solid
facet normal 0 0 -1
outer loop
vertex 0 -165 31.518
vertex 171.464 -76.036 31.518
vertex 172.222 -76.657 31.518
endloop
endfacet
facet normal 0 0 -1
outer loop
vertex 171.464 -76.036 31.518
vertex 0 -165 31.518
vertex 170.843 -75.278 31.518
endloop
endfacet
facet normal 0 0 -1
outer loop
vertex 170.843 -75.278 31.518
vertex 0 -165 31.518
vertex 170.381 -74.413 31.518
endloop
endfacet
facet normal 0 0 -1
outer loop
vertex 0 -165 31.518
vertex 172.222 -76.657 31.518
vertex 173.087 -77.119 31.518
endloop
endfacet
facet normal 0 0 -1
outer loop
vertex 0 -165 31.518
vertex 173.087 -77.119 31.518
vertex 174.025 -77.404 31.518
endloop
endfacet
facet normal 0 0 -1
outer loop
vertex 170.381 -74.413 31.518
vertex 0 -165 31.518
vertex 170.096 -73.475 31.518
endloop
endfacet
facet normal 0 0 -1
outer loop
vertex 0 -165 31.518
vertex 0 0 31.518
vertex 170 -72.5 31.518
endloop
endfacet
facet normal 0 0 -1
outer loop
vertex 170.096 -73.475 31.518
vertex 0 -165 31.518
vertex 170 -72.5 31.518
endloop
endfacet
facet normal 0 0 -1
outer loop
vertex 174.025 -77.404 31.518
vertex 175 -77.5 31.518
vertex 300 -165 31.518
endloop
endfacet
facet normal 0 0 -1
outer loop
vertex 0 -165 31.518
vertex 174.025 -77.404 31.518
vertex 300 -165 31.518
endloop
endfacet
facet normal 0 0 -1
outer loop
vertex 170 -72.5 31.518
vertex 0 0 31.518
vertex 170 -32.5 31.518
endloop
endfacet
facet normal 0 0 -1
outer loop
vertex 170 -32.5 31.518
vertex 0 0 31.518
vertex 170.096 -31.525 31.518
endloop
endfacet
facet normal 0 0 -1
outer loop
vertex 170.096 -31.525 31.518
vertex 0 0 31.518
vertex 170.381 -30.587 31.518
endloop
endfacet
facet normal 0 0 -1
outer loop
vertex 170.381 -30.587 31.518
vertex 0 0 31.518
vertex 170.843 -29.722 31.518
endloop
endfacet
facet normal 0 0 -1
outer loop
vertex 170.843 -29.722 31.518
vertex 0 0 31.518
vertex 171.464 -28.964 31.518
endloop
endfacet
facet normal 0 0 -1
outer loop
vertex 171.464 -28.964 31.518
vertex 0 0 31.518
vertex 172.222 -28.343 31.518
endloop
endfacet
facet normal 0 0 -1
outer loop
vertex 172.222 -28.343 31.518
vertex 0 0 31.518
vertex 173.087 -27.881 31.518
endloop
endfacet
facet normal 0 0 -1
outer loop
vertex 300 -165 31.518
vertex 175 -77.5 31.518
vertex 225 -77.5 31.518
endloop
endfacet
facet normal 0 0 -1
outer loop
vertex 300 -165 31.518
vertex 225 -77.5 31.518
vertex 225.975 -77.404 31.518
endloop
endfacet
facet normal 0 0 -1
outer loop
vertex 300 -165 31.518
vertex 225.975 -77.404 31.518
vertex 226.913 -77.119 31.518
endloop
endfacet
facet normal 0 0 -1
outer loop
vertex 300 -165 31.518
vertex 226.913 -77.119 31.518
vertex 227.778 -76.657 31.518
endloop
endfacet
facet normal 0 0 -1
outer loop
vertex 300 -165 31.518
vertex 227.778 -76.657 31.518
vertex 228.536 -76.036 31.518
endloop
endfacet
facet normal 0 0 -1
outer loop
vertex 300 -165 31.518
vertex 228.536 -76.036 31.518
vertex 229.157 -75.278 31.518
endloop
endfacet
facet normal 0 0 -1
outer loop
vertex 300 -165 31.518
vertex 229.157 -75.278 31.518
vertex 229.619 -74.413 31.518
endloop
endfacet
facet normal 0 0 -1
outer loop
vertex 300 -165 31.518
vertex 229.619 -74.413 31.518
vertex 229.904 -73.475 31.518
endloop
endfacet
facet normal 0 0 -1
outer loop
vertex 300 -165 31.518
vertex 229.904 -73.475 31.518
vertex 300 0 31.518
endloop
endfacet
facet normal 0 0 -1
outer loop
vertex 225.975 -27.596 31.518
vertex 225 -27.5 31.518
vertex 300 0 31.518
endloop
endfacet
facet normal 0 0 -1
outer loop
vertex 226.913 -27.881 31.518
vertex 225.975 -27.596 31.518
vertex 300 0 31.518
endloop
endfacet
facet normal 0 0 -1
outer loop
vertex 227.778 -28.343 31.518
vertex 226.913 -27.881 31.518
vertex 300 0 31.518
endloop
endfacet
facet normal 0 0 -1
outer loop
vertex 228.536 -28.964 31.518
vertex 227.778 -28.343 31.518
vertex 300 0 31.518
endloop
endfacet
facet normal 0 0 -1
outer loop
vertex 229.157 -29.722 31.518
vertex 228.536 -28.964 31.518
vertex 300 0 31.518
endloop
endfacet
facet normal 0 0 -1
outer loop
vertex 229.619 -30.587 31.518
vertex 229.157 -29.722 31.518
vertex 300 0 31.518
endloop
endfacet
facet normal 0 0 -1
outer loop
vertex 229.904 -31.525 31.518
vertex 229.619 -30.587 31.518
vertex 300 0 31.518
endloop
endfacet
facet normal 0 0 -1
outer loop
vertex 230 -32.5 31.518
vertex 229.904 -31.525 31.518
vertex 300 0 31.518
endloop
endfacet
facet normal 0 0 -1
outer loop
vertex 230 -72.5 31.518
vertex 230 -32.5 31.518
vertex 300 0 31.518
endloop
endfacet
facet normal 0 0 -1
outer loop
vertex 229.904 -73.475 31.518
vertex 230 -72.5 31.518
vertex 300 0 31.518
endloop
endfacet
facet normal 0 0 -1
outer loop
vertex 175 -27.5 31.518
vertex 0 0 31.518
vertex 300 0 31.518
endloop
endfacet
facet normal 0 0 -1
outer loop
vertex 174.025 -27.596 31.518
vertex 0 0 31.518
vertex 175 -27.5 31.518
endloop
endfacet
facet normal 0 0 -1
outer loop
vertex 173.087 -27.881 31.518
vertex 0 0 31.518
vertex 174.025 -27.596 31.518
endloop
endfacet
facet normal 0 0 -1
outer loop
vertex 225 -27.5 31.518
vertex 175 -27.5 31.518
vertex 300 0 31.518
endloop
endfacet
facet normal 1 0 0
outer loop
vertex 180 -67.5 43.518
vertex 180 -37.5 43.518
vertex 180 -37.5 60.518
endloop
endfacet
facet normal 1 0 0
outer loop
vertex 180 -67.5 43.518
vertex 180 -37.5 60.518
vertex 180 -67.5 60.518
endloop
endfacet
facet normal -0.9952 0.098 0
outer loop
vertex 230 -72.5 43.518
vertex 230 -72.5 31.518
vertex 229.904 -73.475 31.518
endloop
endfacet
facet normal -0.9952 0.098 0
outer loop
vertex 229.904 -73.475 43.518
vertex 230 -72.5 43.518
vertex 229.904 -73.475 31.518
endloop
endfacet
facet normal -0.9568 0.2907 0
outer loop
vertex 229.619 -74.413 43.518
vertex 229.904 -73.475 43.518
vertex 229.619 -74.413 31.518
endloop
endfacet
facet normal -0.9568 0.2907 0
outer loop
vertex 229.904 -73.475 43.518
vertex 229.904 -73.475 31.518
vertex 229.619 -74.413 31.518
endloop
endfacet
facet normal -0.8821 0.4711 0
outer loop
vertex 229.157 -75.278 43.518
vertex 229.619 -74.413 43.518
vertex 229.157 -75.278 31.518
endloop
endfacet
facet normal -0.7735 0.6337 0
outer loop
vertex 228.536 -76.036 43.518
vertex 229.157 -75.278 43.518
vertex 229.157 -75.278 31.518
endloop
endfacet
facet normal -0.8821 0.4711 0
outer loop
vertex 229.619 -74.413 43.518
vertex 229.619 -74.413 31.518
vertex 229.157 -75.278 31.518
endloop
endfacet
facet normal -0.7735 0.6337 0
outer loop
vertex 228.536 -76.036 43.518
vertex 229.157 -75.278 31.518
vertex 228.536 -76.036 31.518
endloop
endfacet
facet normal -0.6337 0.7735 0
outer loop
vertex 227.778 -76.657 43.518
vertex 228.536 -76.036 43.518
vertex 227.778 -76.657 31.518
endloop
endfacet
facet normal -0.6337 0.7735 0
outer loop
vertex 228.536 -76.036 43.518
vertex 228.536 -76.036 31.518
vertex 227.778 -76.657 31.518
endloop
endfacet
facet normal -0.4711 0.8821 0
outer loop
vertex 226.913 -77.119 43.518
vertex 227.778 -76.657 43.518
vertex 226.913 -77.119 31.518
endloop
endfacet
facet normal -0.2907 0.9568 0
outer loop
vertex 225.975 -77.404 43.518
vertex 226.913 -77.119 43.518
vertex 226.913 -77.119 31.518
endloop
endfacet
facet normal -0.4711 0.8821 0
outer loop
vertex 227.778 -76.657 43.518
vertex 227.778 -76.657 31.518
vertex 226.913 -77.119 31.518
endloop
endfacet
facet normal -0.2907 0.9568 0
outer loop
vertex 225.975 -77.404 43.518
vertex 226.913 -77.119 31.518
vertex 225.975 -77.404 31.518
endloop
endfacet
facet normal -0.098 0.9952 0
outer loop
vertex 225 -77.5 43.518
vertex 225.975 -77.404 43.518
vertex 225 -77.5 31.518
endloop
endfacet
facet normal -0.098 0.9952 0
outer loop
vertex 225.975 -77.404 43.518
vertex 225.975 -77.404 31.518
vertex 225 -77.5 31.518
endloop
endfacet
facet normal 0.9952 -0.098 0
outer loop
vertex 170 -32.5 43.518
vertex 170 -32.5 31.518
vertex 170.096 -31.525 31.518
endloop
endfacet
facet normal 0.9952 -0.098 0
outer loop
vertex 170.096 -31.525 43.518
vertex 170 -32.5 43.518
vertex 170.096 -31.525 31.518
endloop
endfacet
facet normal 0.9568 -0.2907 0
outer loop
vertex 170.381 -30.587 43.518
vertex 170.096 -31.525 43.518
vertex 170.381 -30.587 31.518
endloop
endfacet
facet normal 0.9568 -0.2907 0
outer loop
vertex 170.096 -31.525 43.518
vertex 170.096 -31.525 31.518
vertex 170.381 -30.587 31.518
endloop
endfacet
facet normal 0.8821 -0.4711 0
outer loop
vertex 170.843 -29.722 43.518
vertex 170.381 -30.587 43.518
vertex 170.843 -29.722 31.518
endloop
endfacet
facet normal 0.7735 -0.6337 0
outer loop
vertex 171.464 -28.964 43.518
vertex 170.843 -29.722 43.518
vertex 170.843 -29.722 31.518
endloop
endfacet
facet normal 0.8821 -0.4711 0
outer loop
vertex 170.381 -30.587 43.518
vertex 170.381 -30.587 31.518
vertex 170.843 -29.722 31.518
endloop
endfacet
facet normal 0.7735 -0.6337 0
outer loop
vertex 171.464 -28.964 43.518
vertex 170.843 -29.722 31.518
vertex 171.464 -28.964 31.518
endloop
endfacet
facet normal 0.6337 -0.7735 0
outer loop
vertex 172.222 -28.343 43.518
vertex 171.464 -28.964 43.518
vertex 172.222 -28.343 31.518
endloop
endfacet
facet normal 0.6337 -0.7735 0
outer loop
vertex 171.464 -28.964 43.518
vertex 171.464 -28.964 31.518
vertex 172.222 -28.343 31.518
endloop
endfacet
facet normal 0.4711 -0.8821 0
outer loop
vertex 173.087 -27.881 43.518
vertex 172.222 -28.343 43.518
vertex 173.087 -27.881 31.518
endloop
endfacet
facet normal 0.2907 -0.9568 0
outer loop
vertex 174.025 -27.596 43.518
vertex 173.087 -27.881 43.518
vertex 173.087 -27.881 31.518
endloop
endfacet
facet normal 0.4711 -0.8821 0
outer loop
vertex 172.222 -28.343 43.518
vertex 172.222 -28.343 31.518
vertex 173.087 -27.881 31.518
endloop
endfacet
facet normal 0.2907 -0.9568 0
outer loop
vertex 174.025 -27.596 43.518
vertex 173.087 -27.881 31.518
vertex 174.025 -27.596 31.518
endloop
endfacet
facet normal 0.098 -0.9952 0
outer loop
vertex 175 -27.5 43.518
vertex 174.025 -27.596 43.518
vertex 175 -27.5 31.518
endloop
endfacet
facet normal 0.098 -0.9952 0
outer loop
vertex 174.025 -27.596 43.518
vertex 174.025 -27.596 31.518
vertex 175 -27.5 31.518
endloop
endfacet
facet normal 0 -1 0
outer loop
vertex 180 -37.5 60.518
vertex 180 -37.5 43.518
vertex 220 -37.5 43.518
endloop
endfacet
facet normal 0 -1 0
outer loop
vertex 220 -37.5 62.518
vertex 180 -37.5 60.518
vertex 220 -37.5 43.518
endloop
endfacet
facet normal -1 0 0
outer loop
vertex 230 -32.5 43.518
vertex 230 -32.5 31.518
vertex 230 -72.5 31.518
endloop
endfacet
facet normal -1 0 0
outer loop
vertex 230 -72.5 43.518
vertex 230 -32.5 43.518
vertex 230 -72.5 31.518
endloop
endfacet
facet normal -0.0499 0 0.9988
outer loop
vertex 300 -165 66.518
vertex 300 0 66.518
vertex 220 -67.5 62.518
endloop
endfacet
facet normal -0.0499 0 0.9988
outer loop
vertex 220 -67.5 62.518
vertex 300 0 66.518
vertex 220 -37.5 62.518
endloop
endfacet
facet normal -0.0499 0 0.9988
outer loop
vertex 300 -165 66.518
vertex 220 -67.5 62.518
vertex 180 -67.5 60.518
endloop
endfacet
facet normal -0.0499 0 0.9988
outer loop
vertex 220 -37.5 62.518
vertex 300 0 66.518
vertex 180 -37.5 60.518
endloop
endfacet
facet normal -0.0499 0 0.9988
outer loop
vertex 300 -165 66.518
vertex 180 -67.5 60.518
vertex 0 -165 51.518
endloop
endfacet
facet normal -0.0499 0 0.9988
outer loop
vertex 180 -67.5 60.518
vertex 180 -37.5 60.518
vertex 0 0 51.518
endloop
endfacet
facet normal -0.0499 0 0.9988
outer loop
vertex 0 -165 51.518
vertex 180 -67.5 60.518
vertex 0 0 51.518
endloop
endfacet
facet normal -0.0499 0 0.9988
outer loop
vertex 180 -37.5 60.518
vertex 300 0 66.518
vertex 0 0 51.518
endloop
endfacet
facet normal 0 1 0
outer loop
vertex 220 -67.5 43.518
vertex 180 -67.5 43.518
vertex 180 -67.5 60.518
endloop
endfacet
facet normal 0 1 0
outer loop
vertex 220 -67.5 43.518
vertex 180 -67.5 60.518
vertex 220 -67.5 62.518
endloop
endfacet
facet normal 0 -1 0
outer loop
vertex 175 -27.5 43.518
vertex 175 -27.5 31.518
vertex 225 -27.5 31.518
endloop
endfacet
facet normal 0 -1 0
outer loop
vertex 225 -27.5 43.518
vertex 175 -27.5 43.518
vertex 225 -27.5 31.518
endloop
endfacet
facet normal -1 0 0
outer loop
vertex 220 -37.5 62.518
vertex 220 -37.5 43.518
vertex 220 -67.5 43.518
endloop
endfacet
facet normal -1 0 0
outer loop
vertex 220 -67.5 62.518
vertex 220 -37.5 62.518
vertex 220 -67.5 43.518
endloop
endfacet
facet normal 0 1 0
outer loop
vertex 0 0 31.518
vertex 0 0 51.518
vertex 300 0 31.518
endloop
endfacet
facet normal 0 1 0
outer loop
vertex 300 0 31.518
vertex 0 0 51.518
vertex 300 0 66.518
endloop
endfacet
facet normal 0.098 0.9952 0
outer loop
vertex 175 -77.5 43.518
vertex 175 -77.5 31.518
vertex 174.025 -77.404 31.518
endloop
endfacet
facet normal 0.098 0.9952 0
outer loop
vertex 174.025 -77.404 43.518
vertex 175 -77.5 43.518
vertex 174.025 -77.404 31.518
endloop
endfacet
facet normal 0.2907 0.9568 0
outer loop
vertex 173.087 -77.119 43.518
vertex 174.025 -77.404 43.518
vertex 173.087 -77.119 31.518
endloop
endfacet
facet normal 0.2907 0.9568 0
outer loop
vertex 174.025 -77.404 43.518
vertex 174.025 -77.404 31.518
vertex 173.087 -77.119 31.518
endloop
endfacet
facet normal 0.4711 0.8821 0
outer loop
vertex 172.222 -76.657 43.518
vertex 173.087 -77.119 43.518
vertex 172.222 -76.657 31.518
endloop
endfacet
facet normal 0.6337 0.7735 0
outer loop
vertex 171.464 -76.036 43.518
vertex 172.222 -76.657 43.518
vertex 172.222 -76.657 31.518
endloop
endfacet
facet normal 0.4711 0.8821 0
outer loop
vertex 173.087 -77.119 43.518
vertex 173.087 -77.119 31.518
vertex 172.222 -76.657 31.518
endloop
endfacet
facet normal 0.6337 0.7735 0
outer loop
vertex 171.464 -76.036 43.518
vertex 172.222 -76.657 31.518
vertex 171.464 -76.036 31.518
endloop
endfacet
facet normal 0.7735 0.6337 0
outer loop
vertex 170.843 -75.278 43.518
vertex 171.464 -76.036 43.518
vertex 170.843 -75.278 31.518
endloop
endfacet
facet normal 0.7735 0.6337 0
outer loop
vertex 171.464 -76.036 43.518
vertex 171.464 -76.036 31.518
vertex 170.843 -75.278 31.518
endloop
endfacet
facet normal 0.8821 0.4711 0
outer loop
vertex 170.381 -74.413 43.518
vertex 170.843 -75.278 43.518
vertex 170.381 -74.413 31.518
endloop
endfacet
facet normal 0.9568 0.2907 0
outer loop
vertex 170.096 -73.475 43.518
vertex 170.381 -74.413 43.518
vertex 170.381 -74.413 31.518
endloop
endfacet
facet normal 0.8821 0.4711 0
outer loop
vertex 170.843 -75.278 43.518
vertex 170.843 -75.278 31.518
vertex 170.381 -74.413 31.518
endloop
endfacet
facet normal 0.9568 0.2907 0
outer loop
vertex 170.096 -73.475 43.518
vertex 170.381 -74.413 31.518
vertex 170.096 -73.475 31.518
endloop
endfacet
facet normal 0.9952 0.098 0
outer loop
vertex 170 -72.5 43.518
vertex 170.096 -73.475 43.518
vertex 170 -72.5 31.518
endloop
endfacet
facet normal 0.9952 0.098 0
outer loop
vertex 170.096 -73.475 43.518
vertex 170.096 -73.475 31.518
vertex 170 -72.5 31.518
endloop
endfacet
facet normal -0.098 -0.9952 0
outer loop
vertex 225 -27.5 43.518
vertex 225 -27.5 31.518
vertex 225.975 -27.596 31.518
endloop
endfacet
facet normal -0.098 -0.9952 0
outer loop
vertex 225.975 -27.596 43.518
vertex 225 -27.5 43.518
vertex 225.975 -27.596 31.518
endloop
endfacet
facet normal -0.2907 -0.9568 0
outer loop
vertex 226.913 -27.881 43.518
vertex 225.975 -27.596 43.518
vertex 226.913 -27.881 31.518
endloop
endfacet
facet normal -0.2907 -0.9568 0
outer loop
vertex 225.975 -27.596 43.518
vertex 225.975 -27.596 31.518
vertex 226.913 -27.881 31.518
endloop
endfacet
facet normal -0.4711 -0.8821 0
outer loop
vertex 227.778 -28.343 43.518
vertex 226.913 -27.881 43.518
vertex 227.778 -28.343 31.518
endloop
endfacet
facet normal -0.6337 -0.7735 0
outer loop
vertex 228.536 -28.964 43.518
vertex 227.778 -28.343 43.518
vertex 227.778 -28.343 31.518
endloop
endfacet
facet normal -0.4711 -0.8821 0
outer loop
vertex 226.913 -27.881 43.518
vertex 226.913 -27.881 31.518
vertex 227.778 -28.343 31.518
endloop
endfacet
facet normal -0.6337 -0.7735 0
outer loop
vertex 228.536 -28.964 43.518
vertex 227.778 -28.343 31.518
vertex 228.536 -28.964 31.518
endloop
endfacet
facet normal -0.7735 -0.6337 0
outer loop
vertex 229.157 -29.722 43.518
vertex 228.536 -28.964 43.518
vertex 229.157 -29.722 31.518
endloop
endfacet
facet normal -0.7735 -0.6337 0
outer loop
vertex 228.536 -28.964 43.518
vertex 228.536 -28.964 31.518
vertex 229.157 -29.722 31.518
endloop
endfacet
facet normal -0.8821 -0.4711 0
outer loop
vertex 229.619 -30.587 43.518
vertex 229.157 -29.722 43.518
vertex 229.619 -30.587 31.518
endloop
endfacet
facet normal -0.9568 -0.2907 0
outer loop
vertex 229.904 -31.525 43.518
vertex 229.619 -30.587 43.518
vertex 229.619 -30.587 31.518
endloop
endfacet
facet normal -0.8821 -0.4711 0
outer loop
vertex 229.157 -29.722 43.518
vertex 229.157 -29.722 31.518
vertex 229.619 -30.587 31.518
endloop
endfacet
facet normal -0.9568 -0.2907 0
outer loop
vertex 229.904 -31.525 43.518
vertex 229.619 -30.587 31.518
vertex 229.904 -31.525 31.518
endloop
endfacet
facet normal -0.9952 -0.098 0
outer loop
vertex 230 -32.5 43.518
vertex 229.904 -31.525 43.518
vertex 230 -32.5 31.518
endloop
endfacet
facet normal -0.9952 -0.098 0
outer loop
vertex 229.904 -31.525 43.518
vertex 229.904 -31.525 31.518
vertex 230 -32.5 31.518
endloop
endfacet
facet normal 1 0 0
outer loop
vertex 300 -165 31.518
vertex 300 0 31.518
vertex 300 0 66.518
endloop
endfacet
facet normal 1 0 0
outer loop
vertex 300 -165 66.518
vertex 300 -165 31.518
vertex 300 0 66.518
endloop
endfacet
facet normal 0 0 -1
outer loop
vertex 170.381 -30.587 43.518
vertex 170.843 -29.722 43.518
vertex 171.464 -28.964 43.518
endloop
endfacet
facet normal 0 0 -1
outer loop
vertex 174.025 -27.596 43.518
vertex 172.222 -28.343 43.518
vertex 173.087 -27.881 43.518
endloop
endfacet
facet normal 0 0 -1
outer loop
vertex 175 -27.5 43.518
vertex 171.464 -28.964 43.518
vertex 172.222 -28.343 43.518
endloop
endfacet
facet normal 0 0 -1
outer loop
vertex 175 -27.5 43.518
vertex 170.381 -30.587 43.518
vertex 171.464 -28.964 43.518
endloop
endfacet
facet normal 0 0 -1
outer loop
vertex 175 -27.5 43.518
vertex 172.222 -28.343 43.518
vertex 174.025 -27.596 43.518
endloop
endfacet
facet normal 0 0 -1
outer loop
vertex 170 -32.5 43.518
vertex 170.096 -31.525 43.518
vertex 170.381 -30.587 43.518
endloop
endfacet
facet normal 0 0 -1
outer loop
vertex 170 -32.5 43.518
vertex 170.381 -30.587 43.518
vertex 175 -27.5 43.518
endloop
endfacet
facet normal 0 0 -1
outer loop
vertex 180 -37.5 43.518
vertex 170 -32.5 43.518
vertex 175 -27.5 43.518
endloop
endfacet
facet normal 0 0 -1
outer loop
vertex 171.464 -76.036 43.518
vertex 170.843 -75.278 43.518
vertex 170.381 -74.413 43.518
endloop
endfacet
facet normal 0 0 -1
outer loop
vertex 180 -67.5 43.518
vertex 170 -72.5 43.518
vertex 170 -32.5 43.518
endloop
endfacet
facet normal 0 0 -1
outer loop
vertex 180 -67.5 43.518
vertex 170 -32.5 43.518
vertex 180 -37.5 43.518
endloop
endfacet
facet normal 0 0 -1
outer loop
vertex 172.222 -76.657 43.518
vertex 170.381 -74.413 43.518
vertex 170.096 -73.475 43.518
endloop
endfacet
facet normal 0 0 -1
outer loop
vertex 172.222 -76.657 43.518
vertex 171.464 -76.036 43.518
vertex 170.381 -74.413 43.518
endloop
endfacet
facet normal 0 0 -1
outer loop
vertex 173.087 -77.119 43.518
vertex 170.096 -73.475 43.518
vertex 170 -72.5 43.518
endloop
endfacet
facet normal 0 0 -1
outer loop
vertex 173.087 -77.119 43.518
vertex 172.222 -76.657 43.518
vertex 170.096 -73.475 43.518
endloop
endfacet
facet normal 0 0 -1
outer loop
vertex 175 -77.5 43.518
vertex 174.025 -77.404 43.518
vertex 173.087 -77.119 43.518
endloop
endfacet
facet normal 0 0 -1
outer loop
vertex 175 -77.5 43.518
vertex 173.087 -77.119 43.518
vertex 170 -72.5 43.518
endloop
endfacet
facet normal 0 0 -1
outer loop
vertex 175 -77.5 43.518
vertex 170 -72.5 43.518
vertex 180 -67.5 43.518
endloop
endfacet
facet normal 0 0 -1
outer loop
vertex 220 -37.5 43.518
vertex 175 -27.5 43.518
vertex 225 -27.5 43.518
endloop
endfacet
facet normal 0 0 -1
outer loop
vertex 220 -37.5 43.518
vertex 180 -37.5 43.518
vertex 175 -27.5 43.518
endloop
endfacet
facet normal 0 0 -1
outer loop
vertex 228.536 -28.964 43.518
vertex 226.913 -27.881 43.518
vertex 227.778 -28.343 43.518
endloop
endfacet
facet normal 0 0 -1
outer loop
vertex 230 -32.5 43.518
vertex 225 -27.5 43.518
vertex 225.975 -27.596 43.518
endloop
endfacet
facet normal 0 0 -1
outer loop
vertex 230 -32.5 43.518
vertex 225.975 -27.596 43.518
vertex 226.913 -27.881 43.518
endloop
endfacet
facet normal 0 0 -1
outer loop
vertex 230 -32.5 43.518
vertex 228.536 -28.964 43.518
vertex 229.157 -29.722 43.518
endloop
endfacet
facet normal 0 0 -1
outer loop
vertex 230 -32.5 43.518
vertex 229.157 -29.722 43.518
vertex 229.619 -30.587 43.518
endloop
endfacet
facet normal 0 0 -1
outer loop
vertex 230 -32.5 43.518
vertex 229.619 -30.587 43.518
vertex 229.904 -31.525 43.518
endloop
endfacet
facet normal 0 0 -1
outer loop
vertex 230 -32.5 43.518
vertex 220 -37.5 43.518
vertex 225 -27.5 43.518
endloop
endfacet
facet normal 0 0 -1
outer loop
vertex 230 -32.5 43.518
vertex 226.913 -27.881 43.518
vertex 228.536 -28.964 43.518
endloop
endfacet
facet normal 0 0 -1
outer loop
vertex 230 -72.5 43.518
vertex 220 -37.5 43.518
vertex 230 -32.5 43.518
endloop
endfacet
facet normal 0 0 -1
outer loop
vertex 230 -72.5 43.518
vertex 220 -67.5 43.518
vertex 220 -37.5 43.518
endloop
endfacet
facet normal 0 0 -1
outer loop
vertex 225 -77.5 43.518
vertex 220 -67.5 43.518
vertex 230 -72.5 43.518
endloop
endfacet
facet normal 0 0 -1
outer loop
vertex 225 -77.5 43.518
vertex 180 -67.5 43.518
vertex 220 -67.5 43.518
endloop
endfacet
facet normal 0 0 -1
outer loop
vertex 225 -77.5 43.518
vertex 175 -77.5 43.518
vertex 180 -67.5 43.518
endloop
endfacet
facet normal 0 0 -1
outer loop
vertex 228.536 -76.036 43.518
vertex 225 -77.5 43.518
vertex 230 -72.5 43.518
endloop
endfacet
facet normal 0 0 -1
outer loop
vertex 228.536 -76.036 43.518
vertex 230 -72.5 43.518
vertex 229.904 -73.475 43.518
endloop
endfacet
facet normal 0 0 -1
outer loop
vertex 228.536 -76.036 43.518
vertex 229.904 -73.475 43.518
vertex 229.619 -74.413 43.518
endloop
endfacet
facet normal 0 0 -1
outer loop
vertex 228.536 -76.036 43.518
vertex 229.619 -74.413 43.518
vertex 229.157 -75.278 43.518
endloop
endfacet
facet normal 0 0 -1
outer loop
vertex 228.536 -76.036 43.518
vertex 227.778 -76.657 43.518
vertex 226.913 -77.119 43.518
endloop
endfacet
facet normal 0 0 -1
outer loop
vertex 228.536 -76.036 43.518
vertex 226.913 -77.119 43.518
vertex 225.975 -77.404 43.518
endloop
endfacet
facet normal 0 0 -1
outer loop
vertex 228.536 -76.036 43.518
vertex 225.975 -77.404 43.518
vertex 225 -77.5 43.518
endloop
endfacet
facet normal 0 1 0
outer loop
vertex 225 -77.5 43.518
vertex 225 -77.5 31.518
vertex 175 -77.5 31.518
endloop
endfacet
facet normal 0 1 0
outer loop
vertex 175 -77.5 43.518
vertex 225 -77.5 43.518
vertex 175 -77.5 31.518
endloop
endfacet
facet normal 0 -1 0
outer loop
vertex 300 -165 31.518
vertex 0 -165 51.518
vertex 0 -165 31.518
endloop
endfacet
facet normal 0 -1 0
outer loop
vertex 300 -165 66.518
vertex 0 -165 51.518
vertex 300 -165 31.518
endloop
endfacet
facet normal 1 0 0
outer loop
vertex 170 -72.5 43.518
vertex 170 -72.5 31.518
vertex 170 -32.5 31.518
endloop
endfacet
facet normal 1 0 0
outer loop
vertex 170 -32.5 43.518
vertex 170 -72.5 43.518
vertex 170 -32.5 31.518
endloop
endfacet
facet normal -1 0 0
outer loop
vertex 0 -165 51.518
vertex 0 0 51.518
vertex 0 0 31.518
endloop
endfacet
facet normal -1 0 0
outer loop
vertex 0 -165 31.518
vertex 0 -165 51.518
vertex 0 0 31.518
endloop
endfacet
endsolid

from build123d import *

# Parameters (mm, degrees)
F1_DEPTH = 165
F2_W     = 40
F2_H     = 30
F3_DEPTH = 35.001
F4_W     = 40
F4_H     = 30
F5_DEPTH = 12


with BuildPart() as f1:
    # F0 (on Front) → F1 (new body)
    with BuildSketch(Plane.XZ):
        Polygon((0, 51.518065), (0, 31.518065), (300, 31.518065), (300, 66.518065), align=None)
    extrude(amount=F1_DEPTH)

    # F2 (on face) → F3 (cut, through all)
    with BuildSketch(Plane(origin=(0, 0, 31.518065), x_dir=(1, 0, 0), z_dir=(0, 0, -1))):
        with Locations((200, 52.5)):
            Rectangle(F2_W, F2_H)
    extrude(amount=-F3_DEPTH, mode=Mode.SUBTRACT)

    # F4 (on face) → F5 (cut)
    with BuildSketch(Plane(origin=(0, 0, 31.518065), x_dir=(1, 0, 0), z_dir=(0, 0, -1))):
        with BuildLine():
            Line((170, 72.5), (170, 32.5))
            ThreePointArc((170, 32.5), (171.464466, 28.964466), (175, 27.5))
            Line((175, 27.5), (225, 27.5))
            ThreePointArc((225, 27.5), (228.535534, 28.964466), (230, 32.5))
            Line((230, 32.5), (230, 72.5))
            ThreePointArc((230, 72.5), (228.535534, 76.035534), (225, 77.5))
            Line((225, 77.5), (175, 77.5))
            ThreePointArc((175, 77.5), (171.464466, 76.035534), (170, 72.5))
        make_face()
        with Locations((200, 52.5)):
            Rectangle(F4_W, F4_H, mode=Mode.SUBTRACT)
    extrude(amount=-F5_DEPTH, mode=Mode.SUBTRACT)


solid = f1.part
